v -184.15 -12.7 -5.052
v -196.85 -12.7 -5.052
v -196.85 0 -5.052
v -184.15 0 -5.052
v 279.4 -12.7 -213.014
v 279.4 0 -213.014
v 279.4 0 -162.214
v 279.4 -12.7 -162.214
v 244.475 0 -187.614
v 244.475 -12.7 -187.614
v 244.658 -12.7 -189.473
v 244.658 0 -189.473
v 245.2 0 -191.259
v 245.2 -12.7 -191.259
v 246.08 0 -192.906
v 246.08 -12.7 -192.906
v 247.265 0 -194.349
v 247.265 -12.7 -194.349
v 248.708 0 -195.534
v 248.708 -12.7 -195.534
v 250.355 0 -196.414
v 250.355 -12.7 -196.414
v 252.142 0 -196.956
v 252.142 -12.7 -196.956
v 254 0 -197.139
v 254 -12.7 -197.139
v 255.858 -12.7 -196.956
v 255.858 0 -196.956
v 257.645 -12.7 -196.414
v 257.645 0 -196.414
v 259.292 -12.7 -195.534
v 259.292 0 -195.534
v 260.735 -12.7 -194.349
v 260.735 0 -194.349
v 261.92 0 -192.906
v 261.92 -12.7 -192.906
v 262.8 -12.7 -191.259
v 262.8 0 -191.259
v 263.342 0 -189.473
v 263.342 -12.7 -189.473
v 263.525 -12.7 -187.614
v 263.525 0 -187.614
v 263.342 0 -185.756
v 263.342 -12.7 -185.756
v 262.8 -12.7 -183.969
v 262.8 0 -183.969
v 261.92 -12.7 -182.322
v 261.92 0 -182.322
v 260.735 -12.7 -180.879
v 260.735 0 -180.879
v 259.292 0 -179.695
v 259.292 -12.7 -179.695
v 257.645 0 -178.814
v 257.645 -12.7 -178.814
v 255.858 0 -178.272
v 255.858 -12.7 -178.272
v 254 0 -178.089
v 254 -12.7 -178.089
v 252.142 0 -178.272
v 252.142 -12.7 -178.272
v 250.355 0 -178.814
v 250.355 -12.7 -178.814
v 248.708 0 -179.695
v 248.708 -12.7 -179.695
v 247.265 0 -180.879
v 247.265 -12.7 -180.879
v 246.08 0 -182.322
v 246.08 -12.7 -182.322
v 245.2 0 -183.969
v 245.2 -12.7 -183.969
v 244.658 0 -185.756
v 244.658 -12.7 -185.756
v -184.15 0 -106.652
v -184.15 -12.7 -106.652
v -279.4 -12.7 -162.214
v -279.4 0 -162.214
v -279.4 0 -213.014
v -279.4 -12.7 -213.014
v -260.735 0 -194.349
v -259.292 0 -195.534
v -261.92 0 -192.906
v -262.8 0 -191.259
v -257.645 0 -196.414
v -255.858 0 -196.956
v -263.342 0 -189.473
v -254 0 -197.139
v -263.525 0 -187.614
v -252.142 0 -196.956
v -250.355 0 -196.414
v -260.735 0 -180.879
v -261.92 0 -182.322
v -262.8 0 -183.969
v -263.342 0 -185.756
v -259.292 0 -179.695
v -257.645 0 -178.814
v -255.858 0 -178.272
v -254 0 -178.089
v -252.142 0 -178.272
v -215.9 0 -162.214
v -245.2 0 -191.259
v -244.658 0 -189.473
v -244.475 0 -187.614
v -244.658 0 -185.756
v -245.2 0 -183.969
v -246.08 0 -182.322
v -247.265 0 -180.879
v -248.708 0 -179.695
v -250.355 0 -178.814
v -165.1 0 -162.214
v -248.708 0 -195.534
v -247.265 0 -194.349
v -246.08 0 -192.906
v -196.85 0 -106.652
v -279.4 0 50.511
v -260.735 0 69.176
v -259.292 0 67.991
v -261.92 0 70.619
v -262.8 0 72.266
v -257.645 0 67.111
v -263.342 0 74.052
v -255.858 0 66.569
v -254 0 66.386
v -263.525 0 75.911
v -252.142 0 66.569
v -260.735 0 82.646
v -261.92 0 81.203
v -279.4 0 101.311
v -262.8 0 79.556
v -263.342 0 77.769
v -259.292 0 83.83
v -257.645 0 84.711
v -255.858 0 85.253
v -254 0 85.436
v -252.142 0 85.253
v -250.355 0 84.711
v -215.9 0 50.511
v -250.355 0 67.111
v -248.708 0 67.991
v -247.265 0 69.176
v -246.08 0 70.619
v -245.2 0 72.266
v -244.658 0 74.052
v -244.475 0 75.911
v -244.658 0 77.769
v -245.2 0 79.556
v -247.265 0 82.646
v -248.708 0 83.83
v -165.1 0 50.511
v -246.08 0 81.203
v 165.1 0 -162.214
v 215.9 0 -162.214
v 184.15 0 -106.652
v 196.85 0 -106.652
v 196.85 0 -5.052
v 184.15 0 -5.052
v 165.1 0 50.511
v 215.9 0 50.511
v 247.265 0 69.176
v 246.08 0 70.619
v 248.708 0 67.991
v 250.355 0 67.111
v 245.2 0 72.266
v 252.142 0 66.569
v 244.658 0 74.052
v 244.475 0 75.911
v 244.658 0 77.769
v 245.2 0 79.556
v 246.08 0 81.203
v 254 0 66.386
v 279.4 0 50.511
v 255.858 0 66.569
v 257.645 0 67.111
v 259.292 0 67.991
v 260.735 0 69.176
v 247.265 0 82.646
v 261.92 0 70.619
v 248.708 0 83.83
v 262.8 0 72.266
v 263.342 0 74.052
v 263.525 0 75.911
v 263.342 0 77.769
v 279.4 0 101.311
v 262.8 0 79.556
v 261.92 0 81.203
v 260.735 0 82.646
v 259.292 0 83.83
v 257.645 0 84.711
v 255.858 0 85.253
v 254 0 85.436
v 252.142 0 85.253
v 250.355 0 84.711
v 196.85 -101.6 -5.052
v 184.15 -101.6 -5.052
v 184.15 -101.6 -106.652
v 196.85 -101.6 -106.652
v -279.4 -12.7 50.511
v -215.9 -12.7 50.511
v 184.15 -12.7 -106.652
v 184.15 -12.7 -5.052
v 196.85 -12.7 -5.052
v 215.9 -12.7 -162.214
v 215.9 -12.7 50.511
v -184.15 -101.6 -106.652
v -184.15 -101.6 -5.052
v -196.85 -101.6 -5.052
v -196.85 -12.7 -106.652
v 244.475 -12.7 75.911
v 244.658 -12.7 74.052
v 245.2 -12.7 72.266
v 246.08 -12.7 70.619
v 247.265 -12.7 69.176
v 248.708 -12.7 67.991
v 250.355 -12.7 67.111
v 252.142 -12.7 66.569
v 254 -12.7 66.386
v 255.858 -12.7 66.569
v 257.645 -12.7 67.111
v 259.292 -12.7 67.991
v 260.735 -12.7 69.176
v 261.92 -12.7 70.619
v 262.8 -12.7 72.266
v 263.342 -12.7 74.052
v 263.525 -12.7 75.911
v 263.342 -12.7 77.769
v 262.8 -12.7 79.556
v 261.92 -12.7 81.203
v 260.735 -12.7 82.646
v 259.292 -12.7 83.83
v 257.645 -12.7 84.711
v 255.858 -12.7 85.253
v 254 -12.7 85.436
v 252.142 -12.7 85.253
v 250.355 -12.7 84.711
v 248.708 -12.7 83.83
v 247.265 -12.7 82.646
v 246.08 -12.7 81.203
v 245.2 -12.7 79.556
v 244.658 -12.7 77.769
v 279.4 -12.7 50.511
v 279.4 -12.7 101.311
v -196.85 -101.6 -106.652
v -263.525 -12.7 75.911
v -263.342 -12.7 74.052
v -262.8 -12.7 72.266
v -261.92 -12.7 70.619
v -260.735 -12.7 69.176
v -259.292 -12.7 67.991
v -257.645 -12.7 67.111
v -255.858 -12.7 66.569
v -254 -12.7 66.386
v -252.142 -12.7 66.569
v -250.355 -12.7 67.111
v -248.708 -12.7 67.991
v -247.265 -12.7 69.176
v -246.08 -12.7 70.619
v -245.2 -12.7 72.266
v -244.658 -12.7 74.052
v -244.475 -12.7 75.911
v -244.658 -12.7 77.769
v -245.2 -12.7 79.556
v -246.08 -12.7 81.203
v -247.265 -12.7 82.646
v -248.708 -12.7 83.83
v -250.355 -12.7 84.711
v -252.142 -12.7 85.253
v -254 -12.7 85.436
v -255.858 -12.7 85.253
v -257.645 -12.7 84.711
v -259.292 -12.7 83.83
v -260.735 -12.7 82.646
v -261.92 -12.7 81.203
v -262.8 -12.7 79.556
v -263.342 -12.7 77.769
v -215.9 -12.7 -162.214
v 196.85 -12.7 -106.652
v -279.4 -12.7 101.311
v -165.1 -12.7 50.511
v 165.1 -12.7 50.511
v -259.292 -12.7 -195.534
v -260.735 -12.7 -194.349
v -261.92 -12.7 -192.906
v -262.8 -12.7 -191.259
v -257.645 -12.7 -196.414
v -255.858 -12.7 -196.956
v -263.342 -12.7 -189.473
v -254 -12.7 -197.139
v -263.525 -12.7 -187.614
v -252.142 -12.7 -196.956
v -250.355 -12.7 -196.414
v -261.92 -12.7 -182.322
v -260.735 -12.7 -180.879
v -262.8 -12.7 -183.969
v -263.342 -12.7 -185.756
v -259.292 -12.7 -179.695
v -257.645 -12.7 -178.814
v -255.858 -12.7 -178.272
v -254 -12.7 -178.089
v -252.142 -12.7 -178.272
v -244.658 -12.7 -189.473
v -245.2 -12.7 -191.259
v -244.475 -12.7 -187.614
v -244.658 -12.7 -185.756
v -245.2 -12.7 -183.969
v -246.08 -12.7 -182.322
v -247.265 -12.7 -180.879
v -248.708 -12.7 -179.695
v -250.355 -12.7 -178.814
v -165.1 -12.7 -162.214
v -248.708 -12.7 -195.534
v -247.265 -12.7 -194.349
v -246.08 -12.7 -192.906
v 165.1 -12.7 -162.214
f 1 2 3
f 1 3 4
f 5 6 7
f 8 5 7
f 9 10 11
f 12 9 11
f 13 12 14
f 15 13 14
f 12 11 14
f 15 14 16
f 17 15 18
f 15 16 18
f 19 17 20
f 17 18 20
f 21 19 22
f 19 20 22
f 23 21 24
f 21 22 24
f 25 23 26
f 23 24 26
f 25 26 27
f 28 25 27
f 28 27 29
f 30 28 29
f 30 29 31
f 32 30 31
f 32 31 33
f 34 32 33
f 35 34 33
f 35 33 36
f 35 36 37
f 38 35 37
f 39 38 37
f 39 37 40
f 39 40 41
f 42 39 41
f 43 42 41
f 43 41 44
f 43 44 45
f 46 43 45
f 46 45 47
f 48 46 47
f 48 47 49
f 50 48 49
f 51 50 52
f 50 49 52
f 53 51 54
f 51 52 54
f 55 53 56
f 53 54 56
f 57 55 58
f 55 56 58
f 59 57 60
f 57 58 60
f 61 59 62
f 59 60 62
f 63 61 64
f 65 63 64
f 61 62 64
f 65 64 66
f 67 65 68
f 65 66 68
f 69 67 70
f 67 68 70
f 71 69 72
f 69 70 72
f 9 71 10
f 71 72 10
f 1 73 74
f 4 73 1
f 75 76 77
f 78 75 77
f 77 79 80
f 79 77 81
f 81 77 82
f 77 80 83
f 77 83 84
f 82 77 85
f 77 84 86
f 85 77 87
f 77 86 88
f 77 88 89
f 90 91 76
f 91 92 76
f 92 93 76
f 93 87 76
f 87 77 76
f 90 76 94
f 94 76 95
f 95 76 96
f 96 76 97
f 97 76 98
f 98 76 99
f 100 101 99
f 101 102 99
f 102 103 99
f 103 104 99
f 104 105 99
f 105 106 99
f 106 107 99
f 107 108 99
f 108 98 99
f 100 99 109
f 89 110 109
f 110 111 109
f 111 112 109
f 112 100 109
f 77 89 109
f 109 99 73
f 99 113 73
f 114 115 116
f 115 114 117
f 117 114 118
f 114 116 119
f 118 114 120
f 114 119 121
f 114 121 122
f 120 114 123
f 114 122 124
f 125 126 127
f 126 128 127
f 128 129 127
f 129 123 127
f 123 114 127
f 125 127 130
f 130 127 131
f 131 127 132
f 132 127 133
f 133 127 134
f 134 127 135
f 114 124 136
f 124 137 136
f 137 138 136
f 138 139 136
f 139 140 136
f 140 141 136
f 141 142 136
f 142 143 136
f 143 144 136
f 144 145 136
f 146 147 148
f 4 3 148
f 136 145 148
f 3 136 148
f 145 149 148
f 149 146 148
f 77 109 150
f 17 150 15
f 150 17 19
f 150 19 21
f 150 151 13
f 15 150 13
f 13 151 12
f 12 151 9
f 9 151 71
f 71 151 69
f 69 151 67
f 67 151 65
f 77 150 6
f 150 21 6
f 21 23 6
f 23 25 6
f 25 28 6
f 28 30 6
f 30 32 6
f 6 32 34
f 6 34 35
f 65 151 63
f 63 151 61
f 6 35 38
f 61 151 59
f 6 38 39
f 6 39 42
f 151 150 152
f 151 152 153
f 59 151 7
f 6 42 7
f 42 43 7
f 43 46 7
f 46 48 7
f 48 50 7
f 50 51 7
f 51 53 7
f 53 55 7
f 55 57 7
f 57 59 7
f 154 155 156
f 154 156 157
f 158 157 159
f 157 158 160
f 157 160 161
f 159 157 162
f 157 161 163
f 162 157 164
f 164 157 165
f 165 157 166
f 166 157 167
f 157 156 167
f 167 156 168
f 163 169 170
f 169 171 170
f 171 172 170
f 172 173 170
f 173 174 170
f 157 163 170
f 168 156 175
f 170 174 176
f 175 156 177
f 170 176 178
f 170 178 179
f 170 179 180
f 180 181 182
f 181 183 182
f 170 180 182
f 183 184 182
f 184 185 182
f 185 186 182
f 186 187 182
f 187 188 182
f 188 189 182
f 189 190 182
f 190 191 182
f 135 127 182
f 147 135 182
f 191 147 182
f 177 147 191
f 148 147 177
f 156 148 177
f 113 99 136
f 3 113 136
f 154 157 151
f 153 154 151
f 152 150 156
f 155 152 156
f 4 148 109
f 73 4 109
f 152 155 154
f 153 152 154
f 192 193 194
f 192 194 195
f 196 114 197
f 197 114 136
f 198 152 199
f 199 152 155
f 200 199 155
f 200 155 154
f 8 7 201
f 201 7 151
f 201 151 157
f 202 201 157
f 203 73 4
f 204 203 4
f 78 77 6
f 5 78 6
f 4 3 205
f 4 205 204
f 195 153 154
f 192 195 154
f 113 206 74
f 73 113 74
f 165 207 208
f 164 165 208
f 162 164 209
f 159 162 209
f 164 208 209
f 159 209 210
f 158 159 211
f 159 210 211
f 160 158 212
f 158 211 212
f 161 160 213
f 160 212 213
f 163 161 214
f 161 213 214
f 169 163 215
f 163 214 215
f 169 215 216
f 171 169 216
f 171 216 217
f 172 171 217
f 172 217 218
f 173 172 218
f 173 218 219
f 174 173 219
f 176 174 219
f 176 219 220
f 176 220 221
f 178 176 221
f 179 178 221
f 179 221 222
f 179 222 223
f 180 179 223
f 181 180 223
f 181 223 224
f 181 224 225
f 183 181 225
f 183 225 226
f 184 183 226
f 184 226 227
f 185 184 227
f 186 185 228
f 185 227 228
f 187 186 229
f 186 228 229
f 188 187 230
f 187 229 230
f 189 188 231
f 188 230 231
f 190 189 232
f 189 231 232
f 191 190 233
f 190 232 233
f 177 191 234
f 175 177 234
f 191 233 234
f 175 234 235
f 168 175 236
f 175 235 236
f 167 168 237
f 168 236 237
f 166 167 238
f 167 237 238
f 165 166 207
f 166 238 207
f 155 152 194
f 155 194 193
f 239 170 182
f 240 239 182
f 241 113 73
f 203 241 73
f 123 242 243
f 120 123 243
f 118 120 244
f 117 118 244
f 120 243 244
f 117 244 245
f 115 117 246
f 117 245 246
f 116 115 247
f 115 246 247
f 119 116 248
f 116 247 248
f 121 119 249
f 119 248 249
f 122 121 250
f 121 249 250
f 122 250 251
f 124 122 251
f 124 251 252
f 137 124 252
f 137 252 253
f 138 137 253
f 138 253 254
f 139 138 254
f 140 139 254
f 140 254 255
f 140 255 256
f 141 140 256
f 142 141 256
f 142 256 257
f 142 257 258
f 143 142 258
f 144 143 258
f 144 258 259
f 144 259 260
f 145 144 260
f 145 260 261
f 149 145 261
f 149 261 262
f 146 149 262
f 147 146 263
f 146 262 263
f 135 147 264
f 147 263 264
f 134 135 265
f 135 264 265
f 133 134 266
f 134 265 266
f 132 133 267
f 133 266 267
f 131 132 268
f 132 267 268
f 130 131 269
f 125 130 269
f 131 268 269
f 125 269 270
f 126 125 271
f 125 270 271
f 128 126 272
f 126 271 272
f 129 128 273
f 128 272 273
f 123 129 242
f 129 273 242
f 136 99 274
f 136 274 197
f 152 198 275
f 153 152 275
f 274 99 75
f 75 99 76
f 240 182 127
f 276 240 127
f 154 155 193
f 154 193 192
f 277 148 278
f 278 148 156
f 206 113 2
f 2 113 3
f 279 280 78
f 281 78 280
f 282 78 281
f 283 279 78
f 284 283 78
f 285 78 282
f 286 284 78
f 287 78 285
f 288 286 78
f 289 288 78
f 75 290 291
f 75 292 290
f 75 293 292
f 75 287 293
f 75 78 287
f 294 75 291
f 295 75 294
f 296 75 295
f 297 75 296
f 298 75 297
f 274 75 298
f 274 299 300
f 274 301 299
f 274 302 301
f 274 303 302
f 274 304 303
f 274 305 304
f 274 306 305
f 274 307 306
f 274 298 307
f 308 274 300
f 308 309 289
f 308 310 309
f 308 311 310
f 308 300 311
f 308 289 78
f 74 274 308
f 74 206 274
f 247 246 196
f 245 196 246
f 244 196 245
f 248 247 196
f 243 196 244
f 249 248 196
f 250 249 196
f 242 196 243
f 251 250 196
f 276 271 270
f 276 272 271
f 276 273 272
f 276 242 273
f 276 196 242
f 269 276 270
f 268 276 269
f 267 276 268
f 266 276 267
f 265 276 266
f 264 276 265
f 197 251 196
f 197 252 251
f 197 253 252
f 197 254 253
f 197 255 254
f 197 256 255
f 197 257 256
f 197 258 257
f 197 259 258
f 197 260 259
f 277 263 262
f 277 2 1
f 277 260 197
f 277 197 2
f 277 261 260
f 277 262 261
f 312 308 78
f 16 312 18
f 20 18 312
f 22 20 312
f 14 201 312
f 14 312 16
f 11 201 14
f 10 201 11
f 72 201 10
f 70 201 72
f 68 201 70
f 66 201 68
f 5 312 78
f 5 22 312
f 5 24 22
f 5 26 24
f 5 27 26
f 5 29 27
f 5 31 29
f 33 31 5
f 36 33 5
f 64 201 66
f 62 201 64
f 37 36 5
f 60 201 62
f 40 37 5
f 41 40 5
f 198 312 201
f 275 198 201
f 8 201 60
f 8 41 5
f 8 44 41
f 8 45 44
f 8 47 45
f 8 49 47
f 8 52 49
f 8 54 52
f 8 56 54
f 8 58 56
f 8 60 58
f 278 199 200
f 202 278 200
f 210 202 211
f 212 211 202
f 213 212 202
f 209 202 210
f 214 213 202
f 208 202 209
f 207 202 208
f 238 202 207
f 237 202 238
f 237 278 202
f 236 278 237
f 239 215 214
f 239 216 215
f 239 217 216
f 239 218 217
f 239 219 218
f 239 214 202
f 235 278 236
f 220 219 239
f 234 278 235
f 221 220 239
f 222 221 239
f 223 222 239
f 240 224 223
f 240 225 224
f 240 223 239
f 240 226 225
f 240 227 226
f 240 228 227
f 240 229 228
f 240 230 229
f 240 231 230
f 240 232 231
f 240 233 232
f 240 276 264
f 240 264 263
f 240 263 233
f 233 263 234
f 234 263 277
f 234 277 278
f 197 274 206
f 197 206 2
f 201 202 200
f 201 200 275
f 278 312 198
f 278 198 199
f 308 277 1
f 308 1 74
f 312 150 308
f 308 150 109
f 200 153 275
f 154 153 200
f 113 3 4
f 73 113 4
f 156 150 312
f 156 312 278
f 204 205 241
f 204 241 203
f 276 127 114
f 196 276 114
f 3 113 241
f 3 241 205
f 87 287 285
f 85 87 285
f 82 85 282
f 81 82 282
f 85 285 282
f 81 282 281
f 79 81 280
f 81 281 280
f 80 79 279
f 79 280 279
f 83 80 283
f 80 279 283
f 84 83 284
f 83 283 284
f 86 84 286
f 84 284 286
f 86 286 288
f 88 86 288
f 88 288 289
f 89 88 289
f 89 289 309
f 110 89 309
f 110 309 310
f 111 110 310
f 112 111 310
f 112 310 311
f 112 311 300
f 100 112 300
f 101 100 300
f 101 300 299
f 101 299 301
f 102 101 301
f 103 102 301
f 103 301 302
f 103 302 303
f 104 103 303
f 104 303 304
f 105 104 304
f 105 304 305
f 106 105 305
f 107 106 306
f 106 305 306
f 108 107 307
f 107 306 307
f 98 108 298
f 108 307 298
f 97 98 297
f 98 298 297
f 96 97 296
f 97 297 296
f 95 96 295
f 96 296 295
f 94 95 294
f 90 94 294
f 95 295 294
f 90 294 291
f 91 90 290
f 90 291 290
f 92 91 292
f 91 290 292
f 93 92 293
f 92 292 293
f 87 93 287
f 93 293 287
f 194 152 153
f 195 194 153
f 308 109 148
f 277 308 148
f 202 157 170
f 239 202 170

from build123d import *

# Parameters (mm, degrees)
F0_W     = 50.8
F0_H     = 212.725
F0_W_2   = 12.7
F0_H_2   = 101.6
F1_DEPTH = 12.7
F2_D     = 19.05
F3_DEPTH = 101.6


with BuildPart() as f1:
    # F0 (on Front) → F1 (new body)
    with BuildSketch(Plane.XZ):
        Polygon((215.9, 50.5107097983), (279.4, 50.5107097983), (279.4, 101.3107097983), (-279.4, 101.3107097983), (-279.4, 50.5107097983), (-215.9, 50.5107097983), (-165.1, 50.5107097983), (165.1, 50.5107097983), align=None)
        with Locations((190.5, -55.8517902017)):
            Rectangle(F0_W, F0_H)
        with Locations((190.5, -55.8517902017)):
            Rectangle(F0_W_2, F0_H_2, mode=Mode.SUBTRACT)
        Polygon((279.4, -162.2142902017), (215.9, -162.2142902017), (165.1, -162.2142902017), (-165.1, -162.2142902017), (-215.9, -162.2142902017), (-279.4, -162.2142902017), (-279.4, -213.0142902017), (279.4, -213.0142902017), align=None)
        with Locations((-190.5, -55.8517902017)):
            Rectangle(F0_W, F0_H)
        with Locations((-190.5, -55.8517902017)):
            Rectangle(F0_W_2, F0_H_2, mode=Mode.SUBTRACT)
    extrude(amount=F1_DEPTH)

    # F2 (through all)
    with Locations(Plane(origin=(0, 0, 0), x_dir=(1, 0, 0), z_dir=(0, 1, 0))):
        with Locations((-254, -75.9107097983), (254, -75.9107097983), (254, 187.6142902017), (-254, 187.6142902017)):
            Hole(F2_D / 2)


with BuildPart() as f3:
    # F0 (on Front) → F3 (new body)
    with BuildSketch(Plane.XZ):
        with Locations((190.5, -55.8517902017)):
            Rectangle(F0_W_2, F0_H_2)
    extrude(amount=F3_DEPTH)


with BuildPart() as f3b:
    # F0 (on Front) → F3, piece 2 (new body)
    with BuildSketch(Plane.XZ):
        with Locations((-190.5, -55.8517902017)):
            Rectangle(F0_W_2, F0_H_2)
    extrude(amount=F3_DEPTH)


solid = Compound([f1.part, f3.part, f3b.part])
